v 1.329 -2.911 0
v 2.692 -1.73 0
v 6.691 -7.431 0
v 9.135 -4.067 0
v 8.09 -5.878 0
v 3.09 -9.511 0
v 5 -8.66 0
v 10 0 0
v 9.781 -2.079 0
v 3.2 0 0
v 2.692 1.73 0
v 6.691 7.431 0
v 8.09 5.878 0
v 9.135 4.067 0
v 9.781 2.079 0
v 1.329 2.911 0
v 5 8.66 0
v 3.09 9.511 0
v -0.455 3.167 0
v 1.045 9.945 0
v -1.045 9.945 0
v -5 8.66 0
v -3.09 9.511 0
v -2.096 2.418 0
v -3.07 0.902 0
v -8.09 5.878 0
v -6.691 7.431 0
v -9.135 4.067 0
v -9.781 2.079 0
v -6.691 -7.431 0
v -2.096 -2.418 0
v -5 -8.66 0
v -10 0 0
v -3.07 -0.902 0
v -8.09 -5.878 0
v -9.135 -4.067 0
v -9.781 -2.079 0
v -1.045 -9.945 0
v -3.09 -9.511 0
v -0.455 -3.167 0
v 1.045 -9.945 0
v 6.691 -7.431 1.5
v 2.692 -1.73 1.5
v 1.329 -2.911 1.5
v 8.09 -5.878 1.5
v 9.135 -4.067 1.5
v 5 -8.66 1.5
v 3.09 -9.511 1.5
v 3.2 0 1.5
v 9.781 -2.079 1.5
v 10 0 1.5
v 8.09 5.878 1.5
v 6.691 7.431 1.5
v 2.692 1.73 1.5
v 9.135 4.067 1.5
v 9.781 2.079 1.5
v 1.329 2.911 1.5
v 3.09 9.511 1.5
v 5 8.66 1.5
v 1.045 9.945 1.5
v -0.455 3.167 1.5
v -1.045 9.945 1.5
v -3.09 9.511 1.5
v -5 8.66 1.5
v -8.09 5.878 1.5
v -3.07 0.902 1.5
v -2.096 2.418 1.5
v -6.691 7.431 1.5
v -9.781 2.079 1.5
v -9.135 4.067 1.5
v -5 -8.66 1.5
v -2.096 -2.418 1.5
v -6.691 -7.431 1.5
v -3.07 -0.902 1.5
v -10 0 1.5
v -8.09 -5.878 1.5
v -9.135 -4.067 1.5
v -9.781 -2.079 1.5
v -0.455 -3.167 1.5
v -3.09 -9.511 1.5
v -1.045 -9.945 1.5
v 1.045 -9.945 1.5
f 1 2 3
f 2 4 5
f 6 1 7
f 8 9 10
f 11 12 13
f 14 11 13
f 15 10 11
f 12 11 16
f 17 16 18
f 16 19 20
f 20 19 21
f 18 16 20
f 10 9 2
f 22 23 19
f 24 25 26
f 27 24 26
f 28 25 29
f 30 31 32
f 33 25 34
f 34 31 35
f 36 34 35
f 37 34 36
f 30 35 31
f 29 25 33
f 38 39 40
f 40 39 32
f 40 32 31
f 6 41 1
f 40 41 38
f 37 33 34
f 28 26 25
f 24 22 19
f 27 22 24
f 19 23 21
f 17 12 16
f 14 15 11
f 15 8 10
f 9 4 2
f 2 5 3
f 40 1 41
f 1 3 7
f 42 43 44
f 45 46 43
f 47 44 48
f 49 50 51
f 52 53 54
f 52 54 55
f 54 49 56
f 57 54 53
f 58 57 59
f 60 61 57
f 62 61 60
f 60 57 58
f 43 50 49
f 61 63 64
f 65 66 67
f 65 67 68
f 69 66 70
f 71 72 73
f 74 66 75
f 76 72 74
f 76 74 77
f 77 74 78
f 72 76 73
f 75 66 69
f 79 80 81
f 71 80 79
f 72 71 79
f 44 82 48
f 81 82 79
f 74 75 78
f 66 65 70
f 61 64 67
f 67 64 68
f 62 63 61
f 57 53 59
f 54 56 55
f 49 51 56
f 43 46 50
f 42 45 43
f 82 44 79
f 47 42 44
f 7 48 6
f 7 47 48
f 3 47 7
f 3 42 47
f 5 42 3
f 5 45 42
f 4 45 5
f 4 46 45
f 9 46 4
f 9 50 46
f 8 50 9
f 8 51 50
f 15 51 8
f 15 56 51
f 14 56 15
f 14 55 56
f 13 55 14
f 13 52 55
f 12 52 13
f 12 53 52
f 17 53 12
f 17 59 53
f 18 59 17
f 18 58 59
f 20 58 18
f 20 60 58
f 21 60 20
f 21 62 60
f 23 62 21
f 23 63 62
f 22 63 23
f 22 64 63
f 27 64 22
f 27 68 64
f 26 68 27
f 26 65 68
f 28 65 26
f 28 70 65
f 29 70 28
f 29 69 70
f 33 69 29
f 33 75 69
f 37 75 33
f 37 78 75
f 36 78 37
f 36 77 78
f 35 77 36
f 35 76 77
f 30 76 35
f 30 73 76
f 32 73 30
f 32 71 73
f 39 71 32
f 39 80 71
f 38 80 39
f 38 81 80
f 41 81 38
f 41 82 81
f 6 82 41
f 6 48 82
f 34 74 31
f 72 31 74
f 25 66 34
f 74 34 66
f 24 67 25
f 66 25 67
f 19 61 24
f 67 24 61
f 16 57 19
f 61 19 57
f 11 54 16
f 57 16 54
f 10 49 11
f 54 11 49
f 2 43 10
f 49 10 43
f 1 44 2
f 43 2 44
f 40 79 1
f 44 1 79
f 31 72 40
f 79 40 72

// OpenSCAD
linear_extrude(1.5)
difference() {
    circle(d=20);
    circle(d=6.4);
}
